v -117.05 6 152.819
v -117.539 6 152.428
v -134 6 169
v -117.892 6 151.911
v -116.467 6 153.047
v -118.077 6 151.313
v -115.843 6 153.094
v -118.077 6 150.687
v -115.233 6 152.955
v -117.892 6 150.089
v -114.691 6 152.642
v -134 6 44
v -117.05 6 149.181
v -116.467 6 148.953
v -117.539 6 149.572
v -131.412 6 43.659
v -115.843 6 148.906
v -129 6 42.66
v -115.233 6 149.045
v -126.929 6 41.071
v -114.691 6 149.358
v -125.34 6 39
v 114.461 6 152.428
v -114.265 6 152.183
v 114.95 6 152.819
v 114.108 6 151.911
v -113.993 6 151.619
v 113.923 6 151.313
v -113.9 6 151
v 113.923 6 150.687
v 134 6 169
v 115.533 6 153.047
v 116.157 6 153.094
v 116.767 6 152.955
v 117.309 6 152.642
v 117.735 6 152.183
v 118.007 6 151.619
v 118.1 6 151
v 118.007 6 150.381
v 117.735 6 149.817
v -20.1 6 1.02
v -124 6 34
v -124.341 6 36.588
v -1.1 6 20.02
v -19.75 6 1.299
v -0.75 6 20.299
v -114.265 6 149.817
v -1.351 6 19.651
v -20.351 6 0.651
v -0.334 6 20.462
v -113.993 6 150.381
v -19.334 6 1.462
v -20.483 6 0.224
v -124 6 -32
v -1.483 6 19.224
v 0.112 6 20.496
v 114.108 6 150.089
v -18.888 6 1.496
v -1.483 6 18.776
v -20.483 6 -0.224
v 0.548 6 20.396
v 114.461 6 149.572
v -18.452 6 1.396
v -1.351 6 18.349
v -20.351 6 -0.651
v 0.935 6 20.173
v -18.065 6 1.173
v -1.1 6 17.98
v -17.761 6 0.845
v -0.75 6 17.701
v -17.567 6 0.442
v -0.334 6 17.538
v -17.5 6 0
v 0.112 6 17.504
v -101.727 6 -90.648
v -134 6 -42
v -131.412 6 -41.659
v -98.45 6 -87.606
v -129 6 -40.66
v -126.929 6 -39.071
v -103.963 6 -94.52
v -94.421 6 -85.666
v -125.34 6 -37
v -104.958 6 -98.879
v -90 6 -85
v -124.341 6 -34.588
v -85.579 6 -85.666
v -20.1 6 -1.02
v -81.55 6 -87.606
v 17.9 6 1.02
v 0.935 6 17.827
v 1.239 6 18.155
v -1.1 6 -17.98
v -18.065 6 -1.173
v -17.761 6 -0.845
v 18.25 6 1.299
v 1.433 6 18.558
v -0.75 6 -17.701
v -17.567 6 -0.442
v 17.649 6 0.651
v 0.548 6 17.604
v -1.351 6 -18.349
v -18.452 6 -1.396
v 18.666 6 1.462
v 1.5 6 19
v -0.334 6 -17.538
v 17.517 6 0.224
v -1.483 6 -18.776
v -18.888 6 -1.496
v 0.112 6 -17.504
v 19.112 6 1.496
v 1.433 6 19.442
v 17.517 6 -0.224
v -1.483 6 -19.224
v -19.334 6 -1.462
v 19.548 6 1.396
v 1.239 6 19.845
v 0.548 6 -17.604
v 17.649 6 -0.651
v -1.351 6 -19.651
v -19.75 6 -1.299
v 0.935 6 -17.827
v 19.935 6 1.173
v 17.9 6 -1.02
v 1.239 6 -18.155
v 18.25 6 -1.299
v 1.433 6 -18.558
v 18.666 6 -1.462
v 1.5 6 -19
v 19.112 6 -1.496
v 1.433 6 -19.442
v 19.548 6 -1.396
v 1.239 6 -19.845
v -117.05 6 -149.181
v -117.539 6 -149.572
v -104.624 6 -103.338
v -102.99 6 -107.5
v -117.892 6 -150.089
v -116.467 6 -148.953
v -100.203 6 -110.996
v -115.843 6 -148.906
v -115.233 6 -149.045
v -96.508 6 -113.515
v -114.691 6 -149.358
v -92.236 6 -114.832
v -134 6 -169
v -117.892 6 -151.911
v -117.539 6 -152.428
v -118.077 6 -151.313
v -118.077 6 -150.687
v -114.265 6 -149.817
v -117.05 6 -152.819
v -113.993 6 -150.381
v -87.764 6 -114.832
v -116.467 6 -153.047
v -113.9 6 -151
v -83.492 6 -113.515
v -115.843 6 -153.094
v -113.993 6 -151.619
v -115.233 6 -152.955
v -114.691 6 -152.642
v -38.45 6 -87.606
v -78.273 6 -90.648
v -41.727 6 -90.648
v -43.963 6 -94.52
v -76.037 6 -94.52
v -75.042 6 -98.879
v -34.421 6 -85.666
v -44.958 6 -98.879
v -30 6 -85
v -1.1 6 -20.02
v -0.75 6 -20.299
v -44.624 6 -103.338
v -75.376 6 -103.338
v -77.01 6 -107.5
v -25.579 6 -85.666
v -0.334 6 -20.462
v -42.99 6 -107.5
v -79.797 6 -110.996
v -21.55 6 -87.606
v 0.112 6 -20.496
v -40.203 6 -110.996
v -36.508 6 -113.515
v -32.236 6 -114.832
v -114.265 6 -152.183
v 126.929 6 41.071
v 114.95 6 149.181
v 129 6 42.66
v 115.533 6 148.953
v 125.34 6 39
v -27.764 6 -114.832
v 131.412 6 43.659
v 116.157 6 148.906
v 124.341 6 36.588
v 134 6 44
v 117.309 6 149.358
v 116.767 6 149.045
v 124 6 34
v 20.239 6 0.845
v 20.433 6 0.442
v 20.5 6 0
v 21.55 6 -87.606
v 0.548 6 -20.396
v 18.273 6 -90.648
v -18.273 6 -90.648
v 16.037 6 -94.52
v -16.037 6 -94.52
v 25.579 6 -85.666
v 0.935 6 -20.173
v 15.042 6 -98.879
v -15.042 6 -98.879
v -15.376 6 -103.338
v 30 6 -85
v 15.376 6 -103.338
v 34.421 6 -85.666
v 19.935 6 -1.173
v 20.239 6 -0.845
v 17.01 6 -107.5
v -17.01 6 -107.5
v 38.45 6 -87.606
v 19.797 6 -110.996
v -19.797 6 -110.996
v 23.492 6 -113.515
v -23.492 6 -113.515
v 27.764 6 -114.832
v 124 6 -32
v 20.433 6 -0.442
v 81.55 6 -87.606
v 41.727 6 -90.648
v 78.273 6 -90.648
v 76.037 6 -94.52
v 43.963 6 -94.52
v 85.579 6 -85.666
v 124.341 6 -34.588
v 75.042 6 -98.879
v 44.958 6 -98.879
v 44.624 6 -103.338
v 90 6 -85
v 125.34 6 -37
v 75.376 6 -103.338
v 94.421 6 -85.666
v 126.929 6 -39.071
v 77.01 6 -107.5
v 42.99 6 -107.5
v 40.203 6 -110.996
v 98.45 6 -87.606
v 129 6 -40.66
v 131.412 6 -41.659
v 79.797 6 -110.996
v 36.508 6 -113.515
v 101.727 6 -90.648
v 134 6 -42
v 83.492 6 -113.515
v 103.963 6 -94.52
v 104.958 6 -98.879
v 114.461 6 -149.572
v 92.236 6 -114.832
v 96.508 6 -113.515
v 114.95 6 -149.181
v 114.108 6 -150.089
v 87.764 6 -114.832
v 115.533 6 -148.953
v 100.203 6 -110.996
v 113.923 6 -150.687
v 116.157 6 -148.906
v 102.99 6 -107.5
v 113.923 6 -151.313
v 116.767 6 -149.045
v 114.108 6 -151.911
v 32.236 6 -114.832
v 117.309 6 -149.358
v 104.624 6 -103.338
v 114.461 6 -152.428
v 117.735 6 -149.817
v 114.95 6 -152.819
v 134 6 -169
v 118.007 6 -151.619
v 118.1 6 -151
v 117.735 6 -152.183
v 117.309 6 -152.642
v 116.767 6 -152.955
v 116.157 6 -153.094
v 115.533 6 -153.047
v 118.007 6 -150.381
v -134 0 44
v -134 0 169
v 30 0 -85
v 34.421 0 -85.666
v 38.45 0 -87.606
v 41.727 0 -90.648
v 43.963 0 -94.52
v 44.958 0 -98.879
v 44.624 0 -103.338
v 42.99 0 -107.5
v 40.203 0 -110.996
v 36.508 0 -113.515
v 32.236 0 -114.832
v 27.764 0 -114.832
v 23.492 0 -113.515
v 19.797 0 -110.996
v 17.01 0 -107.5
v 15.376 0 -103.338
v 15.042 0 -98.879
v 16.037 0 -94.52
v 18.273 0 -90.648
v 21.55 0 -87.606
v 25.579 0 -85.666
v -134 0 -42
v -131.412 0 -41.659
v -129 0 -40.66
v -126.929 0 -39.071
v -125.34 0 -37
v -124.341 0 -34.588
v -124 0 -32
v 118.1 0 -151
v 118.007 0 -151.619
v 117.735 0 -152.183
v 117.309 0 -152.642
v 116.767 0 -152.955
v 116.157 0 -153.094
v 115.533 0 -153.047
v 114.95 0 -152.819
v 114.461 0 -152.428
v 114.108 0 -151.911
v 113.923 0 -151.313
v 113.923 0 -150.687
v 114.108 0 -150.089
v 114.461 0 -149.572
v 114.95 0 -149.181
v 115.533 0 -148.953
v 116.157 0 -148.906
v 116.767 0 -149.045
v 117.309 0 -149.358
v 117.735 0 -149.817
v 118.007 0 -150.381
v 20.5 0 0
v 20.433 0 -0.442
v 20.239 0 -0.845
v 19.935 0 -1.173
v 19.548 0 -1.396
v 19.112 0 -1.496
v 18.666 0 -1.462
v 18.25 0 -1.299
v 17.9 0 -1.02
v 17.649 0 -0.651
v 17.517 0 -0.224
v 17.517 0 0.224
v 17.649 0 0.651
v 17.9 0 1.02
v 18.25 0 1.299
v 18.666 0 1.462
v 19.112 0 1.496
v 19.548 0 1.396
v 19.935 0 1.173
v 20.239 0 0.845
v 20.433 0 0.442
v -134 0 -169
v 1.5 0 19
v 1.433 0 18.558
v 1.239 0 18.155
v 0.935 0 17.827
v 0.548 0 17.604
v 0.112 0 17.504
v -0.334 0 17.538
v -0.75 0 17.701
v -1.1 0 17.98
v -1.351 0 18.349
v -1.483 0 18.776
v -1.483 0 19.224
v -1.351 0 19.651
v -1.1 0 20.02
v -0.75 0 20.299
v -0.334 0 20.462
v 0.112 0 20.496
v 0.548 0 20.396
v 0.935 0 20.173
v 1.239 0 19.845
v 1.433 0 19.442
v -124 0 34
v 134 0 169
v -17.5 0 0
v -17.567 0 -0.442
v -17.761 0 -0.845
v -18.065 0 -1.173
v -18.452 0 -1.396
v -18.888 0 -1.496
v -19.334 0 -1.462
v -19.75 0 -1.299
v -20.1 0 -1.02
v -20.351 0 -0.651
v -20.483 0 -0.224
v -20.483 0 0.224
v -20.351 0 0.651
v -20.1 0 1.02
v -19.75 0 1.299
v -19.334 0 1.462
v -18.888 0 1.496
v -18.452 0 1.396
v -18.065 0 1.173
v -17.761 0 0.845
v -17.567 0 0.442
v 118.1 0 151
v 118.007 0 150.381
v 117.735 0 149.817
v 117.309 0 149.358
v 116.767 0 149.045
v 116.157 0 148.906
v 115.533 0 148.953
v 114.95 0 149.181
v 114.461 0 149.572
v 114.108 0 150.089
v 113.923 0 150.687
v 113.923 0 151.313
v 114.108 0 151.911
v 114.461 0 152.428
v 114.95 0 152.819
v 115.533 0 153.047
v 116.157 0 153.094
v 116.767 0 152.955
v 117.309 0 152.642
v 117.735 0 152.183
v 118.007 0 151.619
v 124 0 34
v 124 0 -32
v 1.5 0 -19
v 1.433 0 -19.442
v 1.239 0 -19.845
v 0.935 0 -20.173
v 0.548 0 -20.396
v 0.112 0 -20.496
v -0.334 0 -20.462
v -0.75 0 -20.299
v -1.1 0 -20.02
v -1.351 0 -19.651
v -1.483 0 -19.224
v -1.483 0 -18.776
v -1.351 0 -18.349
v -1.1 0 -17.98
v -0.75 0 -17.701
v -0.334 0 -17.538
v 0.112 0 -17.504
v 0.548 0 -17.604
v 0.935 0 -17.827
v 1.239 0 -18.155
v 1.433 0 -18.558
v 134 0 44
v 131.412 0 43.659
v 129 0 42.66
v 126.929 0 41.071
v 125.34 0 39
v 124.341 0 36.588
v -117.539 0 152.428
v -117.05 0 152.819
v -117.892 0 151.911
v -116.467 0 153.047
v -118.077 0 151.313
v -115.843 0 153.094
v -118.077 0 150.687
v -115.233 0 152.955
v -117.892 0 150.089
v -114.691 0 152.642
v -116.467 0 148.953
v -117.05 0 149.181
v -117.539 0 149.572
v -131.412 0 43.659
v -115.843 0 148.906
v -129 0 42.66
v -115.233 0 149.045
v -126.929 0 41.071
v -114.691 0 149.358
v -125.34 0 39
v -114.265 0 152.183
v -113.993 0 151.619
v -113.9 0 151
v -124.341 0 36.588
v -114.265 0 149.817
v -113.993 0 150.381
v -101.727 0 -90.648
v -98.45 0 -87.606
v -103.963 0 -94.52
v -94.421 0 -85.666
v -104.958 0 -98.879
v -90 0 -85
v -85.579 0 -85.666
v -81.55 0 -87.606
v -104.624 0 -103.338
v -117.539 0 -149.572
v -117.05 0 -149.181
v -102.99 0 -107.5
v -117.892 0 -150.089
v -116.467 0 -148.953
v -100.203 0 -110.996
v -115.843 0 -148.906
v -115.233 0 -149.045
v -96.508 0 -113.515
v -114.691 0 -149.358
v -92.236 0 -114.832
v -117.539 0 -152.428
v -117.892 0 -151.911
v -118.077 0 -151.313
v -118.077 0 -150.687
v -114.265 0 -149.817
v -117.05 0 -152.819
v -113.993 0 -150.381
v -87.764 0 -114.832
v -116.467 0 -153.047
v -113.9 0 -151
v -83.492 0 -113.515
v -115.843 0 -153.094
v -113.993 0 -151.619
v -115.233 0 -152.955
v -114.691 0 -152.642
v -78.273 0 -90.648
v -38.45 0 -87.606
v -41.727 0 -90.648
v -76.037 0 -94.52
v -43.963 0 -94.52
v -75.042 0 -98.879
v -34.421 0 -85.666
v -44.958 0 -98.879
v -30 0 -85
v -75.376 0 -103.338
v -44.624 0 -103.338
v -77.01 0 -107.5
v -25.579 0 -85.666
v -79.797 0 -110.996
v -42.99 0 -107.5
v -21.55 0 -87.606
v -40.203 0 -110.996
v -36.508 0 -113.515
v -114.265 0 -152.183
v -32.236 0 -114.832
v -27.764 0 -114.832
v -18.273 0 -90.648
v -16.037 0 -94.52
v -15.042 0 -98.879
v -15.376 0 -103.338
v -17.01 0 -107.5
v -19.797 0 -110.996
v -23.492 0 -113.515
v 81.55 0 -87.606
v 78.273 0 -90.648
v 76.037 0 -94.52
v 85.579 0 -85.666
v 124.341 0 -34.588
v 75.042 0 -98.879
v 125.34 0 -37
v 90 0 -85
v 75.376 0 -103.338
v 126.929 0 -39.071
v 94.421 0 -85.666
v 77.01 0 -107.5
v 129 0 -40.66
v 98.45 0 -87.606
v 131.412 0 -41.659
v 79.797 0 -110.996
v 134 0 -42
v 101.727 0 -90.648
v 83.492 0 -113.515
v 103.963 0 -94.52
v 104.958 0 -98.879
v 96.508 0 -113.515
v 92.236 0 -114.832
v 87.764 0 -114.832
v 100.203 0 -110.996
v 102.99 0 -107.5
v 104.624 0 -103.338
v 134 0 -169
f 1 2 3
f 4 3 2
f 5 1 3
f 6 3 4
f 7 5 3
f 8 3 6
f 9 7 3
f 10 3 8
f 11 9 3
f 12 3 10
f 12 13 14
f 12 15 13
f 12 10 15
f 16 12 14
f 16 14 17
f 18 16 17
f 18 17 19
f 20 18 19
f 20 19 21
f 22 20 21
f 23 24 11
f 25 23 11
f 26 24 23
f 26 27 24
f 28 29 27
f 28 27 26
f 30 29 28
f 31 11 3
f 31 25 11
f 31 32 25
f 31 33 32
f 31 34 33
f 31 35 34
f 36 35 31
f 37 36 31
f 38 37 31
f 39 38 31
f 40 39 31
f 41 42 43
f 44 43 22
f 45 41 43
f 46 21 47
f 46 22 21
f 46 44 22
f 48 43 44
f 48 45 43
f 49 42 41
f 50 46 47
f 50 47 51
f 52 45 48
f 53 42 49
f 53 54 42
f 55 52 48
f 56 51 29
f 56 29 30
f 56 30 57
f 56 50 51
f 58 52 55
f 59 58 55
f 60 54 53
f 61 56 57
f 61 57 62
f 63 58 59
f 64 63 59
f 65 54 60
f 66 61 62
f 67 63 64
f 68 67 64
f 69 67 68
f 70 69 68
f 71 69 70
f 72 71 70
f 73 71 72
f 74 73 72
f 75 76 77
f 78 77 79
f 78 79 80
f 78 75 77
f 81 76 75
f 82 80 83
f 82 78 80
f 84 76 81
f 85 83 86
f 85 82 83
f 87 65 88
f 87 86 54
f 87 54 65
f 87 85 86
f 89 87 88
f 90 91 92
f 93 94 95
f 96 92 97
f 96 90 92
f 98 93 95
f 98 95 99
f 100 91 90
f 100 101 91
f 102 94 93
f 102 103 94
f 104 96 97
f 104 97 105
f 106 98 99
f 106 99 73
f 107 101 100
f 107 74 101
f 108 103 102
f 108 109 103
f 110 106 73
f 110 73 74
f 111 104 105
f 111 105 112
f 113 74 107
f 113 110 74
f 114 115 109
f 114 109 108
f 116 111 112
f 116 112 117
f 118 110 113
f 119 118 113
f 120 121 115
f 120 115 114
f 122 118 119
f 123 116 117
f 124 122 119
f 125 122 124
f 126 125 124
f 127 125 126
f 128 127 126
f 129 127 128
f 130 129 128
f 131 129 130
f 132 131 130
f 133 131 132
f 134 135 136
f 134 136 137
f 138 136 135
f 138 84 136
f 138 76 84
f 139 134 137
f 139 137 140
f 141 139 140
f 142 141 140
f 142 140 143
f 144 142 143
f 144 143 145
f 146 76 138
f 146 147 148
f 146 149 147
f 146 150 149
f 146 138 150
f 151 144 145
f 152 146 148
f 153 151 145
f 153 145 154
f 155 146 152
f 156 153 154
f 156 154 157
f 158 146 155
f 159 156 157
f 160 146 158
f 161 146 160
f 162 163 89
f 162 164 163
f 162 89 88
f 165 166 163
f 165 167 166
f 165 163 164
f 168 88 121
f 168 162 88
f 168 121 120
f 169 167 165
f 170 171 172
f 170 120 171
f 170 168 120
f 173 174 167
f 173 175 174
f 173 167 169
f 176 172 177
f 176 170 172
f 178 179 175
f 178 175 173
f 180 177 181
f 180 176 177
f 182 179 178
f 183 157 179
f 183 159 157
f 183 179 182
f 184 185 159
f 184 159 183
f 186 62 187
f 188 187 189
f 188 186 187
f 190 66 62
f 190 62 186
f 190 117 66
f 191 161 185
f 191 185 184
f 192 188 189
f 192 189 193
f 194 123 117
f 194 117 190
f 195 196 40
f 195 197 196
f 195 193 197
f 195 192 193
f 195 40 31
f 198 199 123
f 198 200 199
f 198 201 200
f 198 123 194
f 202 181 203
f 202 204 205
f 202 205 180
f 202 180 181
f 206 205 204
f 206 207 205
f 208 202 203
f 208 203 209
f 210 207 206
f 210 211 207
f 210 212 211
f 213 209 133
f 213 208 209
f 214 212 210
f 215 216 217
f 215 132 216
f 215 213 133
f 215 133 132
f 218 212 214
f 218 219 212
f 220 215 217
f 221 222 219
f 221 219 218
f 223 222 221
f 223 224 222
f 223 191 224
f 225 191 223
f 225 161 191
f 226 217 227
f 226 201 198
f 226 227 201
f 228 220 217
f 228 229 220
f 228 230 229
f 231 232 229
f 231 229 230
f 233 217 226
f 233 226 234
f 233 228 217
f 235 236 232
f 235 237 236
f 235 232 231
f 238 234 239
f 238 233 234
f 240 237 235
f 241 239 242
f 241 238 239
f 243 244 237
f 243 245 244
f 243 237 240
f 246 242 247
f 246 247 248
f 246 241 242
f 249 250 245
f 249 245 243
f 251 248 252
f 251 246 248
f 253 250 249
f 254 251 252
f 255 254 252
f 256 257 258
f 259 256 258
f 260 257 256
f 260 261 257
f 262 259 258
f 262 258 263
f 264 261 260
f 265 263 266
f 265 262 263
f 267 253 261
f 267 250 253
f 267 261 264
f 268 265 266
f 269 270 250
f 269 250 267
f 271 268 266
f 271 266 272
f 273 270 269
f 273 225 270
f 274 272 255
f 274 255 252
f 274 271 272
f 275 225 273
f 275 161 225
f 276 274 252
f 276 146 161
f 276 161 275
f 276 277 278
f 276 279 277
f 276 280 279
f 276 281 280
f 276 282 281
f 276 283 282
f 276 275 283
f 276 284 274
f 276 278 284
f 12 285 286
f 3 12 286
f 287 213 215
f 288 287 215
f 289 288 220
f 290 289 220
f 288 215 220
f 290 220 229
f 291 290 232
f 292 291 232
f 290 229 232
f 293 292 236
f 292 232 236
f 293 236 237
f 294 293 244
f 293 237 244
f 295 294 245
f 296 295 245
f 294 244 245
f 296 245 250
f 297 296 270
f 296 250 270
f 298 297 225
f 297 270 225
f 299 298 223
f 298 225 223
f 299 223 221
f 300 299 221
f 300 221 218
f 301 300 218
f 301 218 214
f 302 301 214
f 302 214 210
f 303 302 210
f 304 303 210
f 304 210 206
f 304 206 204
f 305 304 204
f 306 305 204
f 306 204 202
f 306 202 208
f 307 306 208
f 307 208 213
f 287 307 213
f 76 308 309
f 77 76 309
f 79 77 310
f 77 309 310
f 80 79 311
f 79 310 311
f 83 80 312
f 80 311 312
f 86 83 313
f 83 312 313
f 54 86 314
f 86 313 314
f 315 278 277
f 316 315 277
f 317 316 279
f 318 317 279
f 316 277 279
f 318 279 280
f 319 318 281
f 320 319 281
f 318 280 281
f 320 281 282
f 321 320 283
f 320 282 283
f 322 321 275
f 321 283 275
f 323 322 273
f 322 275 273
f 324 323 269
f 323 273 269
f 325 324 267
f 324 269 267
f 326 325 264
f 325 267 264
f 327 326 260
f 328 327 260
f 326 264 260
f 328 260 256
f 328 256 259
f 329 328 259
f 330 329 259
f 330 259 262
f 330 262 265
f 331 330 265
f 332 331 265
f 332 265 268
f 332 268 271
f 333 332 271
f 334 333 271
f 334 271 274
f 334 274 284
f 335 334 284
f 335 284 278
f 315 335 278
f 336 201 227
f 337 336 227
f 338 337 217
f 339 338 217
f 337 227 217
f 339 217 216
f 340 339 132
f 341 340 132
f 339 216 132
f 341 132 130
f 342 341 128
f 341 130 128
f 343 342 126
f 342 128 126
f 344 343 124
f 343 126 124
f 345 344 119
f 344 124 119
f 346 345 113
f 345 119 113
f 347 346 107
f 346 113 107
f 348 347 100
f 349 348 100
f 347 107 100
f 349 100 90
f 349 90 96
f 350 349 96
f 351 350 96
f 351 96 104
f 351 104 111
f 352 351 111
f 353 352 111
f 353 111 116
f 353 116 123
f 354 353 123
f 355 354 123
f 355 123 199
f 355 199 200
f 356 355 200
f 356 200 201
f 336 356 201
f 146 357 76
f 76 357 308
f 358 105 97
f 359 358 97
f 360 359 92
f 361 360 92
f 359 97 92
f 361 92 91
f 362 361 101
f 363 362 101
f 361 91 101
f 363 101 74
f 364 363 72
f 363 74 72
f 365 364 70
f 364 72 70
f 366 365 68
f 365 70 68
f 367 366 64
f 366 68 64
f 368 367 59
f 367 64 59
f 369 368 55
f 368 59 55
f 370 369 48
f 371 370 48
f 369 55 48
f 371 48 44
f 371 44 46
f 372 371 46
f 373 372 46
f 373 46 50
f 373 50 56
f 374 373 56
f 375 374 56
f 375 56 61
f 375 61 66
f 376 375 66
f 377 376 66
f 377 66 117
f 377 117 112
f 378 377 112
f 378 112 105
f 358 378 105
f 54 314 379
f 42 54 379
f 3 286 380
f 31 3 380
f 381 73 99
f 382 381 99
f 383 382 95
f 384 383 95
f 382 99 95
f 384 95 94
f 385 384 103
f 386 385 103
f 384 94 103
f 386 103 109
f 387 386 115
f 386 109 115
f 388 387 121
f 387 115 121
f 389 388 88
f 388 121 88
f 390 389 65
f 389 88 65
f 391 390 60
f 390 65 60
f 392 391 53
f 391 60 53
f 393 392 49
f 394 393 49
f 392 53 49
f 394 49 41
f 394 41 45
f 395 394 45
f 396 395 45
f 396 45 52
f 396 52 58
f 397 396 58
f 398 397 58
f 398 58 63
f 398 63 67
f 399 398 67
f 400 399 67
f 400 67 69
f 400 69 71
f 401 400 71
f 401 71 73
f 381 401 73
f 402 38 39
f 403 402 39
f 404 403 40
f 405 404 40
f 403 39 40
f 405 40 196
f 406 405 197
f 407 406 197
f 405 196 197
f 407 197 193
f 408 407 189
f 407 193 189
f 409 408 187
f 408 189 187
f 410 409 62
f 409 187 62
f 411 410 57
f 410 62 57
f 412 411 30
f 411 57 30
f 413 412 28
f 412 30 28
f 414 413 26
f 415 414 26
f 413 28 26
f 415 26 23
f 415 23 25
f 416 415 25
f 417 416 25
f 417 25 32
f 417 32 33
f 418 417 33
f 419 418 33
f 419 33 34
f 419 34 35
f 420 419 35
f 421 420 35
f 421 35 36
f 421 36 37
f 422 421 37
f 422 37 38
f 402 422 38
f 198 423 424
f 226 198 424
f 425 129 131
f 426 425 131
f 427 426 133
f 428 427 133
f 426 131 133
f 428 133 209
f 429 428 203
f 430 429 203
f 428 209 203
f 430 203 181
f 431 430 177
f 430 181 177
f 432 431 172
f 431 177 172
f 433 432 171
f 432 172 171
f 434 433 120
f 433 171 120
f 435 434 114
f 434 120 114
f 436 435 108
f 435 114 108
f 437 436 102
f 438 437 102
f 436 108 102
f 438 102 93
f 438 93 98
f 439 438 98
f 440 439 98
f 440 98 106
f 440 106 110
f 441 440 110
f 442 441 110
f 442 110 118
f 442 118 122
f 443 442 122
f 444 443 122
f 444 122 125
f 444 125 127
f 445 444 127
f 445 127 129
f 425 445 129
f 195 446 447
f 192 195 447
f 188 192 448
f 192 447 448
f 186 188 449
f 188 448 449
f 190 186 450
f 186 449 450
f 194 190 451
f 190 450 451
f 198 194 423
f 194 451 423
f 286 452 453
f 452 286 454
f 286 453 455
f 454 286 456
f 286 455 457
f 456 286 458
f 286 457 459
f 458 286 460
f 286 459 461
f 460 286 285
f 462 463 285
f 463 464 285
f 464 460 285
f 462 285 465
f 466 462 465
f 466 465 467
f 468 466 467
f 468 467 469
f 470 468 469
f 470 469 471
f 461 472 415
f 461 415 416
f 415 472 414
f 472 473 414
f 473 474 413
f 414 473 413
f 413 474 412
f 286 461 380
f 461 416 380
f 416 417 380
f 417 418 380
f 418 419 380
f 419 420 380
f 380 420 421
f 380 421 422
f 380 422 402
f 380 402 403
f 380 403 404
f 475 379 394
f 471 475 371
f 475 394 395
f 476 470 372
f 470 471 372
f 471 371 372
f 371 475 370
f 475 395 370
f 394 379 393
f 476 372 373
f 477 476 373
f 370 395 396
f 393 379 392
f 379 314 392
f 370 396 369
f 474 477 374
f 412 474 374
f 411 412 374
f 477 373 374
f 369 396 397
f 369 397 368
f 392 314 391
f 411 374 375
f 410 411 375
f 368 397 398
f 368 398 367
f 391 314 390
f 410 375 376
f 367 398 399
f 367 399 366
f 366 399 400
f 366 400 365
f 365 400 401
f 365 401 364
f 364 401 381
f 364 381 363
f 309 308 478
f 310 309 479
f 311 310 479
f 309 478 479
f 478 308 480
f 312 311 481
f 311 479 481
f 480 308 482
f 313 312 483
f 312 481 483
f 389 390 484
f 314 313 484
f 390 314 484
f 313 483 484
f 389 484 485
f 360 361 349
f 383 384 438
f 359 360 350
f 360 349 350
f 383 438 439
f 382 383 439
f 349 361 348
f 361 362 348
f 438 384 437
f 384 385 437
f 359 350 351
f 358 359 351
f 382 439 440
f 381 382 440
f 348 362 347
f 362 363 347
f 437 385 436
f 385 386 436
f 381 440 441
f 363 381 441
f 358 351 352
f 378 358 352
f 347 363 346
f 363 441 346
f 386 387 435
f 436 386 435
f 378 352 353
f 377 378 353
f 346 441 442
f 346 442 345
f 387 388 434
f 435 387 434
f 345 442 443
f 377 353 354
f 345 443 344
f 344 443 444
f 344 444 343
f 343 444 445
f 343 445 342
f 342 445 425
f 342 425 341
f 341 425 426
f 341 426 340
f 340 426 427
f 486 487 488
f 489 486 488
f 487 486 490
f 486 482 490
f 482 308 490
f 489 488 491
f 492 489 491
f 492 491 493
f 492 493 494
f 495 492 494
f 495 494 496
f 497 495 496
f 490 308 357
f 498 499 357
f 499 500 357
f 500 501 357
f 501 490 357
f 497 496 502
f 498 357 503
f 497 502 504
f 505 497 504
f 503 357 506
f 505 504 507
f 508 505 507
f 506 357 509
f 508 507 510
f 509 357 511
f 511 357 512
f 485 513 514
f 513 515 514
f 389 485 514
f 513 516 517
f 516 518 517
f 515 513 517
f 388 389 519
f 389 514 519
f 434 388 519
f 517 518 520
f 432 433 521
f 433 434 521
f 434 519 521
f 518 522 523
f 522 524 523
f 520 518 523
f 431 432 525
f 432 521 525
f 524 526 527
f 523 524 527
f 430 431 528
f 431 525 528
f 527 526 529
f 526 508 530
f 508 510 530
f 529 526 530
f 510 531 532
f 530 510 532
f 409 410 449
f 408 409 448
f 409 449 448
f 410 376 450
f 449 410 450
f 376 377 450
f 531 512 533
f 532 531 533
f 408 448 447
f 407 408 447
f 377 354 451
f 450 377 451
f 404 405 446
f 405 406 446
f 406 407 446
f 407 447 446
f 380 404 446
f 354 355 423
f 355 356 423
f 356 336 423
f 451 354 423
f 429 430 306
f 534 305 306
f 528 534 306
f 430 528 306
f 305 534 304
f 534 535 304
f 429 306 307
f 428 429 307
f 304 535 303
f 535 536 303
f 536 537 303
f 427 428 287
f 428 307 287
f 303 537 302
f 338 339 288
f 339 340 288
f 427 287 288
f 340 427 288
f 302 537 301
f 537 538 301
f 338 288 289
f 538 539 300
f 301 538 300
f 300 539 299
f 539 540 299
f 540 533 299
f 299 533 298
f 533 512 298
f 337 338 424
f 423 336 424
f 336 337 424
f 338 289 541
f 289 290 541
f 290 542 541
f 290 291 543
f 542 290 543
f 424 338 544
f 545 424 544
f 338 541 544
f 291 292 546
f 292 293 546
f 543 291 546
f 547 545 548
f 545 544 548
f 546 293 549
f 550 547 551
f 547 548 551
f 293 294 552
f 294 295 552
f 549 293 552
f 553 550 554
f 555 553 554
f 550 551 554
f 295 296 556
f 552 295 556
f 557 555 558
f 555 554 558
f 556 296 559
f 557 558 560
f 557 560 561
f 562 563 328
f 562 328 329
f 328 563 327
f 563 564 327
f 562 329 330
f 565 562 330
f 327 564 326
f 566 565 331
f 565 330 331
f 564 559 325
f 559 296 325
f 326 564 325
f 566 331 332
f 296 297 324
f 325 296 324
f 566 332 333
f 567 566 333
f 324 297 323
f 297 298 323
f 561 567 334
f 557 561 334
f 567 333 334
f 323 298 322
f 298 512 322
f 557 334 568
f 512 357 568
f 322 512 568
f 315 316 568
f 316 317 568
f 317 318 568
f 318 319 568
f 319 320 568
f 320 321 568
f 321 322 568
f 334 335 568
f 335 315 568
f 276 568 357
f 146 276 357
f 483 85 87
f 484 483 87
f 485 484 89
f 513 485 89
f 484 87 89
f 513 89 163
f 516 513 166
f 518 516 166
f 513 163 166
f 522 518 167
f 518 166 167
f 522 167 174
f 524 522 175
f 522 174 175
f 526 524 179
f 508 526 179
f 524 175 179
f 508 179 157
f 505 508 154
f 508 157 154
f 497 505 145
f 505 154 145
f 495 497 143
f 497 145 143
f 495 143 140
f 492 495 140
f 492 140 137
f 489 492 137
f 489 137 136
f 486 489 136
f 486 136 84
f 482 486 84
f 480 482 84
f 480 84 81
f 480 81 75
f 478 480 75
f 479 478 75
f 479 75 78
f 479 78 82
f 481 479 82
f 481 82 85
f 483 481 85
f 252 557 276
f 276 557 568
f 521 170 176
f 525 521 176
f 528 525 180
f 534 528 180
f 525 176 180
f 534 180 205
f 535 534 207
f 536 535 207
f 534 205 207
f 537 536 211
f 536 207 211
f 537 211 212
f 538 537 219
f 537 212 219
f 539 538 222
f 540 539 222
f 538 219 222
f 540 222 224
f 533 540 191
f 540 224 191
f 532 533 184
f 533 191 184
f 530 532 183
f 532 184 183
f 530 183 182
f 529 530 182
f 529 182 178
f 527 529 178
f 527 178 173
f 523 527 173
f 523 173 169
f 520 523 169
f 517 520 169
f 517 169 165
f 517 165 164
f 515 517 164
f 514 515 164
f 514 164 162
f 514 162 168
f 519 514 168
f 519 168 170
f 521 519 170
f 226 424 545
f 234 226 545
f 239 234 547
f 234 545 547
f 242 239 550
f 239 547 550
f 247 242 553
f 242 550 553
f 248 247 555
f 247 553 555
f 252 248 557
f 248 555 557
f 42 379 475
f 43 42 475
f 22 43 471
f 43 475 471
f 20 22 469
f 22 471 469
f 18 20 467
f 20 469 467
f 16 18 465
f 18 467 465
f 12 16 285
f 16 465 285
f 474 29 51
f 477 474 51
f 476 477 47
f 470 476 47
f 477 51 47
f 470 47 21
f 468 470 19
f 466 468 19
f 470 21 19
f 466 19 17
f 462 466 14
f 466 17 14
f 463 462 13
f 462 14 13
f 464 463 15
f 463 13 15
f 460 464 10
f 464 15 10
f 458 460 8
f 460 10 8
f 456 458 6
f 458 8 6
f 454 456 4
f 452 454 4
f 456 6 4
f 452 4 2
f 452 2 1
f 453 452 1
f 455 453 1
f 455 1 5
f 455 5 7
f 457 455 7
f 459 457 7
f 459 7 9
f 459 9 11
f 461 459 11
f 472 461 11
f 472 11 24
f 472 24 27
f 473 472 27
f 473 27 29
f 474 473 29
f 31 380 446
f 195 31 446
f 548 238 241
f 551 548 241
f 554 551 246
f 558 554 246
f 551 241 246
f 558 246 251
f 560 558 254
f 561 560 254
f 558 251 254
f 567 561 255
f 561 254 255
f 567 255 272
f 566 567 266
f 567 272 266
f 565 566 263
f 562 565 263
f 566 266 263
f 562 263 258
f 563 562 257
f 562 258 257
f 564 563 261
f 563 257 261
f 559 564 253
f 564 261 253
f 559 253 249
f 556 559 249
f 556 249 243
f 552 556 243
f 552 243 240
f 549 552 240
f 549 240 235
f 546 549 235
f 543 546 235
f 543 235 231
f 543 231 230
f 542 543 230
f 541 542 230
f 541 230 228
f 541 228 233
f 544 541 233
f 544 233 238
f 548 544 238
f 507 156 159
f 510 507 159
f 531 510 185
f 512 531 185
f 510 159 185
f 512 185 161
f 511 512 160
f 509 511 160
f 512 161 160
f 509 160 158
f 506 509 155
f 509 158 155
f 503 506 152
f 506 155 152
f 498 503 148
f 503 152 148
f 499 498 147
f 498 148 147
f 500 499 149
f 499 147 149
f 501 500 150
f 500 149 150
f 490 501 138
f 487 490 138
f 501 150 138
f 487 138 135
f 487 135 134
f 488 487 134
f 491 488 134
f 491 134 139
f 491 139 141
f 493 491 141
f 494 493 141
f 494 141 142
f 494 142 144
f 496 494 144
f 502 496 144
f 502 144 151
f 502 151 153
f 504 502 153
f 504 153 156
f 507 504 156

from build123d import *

# Parameters (mm, degrees)
RESSALTO_EXTRUS_O1_DEPTH     = 6
FURO_ROSCADO_DE_M41_D        = 3
ESBO_O6_R                    = 15
CORTE_EXTRUS_O1_DEPTH        = 216.761442339
FURO_DE_DI_METRO_4_2_4_2_1_D = 4.2


with BuildPart() as part:
    # Esboço1 → Ressalto-extrusão1 (new body)
    with BuildSketch(Plane(origin=(0, 0, 0), x_dir=(1, 0, 0), z_dir=(0, 1, 0))):
        with BuildLine():
            Line((-134, -169), (134, -169))
            Line((134, -169), (134, -44))
            ThreePointArc((134, -44), (126.928932188, -41.071067812), (124, -34))
            Line((124, -34), (124, 32))
            ThreePointArc((124, 32), (126.928932188, 39.071067812), (134, 42))
            Line((134, 42), (134, 169))
            Line((134, 169), (-134, 169))
            Line((-134, 169), (-134, 42))
            ThreePointArc((-134, 42), (-126.928932188, 39.071067812), (-124, 32))
            Line((-124, 32), (-124, -34))
            ThreePointArc((-124, -34), (-126.928932188, -41.071067812), (-134, -44))
            Line((-134, -44), (-134, -169))
        make_face()
    extrude(amount=RESSALTO_EXTRUS_O1_DEPTH)

    # Furo roscado de M41 (through all)
    with Locations(Plane(origin=(0, 0, 0), x_dir=(-1, 0, 0), z_dir=(0, -1, 0))):
        with Locations((19, 0), (0, 19), (-19, 0), (0, -19)):
            Hole(FURO_ROSCADO_DE_M41_D / 2)

    # Esboço6 → Corte-extrusão1 (cut, through all)
    with BuildSketch(Plane(origin=(0, 6, 0), x_dir=(1, 0, 0), z_dir=(0, 1, 0))):
        with Locations(Location((-90, 100, 0), (0, 0, 270))):
            Circle(ESBO_O6_R)
        with Locations(Location((-30, 100, 0), (0, 0, 270))):
            Circle(ESBO_O6_R)
        with Locations(Location((30, 100, 0), (0, 0, 270))):
            Circle(ESBO_O6_R)
        with Locations(Location((90, 100, 0), (0, 0, 270))):
            Circle(ESBO_O6_R)
    extrude(amount=-CORTE_EXTRUS_O1_DEPTH, mode=Mode.SUBTRACT)

    # Furo de diâmetro Ø4.2 (4.2)1 (through all)
    with Locations(Plane(origin=(0, 0, 0), x_dir=(-1, 0, 0), z_dir=(0, -1, 0))):
        with Locations((-116, 151), (-116, -151), (116, 151), (116, -151)):
            Hole(FURO_DE_DI_METRO_4_2_4_2_1_D / 2)


solid = part.part
